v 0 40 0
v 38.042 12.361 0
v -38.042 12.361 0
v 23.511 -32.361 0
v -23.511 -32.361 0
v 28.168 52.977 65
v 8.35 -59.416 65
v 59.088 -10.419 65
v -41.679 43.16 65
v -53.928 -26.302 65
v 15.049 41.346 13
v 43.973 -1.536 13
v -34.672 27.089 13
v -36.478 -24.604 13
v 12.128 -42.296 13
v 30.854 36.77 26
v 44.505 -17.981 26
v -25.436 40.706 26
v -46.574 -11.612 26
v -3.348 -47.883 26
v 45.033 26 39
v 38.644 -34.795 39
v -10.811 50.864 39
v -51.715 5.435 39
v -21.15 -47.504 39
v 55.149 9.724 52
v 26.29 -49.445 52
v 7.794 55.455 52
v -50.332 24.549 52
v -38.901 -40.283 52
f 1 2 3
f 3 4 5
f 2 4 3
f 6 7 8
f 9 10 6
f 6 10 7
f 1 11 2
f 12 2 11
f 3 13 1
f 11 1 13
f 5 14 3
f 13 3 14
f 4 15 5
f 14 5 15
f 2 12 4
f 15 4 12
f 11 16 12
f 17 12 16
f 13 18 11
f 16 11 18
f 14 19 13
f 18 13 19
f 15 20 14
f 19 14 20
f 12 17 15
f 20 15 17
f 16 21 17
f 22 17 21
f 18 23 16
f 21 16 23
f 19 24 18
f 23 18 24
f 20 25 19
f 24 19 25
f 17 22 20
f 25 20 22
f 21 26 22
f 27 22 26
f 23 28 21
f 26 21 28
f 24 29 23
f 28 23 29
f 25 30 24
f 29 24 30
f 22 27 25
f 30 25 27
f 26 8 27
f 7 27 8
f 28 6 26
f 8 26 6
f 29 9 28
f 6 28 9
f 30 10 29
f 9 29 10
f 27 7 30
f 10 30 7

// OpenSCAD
num_points = 5;
height = 65;
radius = 40;
twist = 100;
slices = 5;
scale = 1.5;

coordinates = function(points, r)
  [
   for (i = [0:points - 1])
     let (deg = i * 360 / points)
       [sin(deg) * r, cos(deg) * r]
   ];

vertices = coordinates(num_points, radius);

linear_extrude(height = height, twist = twist, slices = slices, scale = scale)
polygon(points = vertices);
